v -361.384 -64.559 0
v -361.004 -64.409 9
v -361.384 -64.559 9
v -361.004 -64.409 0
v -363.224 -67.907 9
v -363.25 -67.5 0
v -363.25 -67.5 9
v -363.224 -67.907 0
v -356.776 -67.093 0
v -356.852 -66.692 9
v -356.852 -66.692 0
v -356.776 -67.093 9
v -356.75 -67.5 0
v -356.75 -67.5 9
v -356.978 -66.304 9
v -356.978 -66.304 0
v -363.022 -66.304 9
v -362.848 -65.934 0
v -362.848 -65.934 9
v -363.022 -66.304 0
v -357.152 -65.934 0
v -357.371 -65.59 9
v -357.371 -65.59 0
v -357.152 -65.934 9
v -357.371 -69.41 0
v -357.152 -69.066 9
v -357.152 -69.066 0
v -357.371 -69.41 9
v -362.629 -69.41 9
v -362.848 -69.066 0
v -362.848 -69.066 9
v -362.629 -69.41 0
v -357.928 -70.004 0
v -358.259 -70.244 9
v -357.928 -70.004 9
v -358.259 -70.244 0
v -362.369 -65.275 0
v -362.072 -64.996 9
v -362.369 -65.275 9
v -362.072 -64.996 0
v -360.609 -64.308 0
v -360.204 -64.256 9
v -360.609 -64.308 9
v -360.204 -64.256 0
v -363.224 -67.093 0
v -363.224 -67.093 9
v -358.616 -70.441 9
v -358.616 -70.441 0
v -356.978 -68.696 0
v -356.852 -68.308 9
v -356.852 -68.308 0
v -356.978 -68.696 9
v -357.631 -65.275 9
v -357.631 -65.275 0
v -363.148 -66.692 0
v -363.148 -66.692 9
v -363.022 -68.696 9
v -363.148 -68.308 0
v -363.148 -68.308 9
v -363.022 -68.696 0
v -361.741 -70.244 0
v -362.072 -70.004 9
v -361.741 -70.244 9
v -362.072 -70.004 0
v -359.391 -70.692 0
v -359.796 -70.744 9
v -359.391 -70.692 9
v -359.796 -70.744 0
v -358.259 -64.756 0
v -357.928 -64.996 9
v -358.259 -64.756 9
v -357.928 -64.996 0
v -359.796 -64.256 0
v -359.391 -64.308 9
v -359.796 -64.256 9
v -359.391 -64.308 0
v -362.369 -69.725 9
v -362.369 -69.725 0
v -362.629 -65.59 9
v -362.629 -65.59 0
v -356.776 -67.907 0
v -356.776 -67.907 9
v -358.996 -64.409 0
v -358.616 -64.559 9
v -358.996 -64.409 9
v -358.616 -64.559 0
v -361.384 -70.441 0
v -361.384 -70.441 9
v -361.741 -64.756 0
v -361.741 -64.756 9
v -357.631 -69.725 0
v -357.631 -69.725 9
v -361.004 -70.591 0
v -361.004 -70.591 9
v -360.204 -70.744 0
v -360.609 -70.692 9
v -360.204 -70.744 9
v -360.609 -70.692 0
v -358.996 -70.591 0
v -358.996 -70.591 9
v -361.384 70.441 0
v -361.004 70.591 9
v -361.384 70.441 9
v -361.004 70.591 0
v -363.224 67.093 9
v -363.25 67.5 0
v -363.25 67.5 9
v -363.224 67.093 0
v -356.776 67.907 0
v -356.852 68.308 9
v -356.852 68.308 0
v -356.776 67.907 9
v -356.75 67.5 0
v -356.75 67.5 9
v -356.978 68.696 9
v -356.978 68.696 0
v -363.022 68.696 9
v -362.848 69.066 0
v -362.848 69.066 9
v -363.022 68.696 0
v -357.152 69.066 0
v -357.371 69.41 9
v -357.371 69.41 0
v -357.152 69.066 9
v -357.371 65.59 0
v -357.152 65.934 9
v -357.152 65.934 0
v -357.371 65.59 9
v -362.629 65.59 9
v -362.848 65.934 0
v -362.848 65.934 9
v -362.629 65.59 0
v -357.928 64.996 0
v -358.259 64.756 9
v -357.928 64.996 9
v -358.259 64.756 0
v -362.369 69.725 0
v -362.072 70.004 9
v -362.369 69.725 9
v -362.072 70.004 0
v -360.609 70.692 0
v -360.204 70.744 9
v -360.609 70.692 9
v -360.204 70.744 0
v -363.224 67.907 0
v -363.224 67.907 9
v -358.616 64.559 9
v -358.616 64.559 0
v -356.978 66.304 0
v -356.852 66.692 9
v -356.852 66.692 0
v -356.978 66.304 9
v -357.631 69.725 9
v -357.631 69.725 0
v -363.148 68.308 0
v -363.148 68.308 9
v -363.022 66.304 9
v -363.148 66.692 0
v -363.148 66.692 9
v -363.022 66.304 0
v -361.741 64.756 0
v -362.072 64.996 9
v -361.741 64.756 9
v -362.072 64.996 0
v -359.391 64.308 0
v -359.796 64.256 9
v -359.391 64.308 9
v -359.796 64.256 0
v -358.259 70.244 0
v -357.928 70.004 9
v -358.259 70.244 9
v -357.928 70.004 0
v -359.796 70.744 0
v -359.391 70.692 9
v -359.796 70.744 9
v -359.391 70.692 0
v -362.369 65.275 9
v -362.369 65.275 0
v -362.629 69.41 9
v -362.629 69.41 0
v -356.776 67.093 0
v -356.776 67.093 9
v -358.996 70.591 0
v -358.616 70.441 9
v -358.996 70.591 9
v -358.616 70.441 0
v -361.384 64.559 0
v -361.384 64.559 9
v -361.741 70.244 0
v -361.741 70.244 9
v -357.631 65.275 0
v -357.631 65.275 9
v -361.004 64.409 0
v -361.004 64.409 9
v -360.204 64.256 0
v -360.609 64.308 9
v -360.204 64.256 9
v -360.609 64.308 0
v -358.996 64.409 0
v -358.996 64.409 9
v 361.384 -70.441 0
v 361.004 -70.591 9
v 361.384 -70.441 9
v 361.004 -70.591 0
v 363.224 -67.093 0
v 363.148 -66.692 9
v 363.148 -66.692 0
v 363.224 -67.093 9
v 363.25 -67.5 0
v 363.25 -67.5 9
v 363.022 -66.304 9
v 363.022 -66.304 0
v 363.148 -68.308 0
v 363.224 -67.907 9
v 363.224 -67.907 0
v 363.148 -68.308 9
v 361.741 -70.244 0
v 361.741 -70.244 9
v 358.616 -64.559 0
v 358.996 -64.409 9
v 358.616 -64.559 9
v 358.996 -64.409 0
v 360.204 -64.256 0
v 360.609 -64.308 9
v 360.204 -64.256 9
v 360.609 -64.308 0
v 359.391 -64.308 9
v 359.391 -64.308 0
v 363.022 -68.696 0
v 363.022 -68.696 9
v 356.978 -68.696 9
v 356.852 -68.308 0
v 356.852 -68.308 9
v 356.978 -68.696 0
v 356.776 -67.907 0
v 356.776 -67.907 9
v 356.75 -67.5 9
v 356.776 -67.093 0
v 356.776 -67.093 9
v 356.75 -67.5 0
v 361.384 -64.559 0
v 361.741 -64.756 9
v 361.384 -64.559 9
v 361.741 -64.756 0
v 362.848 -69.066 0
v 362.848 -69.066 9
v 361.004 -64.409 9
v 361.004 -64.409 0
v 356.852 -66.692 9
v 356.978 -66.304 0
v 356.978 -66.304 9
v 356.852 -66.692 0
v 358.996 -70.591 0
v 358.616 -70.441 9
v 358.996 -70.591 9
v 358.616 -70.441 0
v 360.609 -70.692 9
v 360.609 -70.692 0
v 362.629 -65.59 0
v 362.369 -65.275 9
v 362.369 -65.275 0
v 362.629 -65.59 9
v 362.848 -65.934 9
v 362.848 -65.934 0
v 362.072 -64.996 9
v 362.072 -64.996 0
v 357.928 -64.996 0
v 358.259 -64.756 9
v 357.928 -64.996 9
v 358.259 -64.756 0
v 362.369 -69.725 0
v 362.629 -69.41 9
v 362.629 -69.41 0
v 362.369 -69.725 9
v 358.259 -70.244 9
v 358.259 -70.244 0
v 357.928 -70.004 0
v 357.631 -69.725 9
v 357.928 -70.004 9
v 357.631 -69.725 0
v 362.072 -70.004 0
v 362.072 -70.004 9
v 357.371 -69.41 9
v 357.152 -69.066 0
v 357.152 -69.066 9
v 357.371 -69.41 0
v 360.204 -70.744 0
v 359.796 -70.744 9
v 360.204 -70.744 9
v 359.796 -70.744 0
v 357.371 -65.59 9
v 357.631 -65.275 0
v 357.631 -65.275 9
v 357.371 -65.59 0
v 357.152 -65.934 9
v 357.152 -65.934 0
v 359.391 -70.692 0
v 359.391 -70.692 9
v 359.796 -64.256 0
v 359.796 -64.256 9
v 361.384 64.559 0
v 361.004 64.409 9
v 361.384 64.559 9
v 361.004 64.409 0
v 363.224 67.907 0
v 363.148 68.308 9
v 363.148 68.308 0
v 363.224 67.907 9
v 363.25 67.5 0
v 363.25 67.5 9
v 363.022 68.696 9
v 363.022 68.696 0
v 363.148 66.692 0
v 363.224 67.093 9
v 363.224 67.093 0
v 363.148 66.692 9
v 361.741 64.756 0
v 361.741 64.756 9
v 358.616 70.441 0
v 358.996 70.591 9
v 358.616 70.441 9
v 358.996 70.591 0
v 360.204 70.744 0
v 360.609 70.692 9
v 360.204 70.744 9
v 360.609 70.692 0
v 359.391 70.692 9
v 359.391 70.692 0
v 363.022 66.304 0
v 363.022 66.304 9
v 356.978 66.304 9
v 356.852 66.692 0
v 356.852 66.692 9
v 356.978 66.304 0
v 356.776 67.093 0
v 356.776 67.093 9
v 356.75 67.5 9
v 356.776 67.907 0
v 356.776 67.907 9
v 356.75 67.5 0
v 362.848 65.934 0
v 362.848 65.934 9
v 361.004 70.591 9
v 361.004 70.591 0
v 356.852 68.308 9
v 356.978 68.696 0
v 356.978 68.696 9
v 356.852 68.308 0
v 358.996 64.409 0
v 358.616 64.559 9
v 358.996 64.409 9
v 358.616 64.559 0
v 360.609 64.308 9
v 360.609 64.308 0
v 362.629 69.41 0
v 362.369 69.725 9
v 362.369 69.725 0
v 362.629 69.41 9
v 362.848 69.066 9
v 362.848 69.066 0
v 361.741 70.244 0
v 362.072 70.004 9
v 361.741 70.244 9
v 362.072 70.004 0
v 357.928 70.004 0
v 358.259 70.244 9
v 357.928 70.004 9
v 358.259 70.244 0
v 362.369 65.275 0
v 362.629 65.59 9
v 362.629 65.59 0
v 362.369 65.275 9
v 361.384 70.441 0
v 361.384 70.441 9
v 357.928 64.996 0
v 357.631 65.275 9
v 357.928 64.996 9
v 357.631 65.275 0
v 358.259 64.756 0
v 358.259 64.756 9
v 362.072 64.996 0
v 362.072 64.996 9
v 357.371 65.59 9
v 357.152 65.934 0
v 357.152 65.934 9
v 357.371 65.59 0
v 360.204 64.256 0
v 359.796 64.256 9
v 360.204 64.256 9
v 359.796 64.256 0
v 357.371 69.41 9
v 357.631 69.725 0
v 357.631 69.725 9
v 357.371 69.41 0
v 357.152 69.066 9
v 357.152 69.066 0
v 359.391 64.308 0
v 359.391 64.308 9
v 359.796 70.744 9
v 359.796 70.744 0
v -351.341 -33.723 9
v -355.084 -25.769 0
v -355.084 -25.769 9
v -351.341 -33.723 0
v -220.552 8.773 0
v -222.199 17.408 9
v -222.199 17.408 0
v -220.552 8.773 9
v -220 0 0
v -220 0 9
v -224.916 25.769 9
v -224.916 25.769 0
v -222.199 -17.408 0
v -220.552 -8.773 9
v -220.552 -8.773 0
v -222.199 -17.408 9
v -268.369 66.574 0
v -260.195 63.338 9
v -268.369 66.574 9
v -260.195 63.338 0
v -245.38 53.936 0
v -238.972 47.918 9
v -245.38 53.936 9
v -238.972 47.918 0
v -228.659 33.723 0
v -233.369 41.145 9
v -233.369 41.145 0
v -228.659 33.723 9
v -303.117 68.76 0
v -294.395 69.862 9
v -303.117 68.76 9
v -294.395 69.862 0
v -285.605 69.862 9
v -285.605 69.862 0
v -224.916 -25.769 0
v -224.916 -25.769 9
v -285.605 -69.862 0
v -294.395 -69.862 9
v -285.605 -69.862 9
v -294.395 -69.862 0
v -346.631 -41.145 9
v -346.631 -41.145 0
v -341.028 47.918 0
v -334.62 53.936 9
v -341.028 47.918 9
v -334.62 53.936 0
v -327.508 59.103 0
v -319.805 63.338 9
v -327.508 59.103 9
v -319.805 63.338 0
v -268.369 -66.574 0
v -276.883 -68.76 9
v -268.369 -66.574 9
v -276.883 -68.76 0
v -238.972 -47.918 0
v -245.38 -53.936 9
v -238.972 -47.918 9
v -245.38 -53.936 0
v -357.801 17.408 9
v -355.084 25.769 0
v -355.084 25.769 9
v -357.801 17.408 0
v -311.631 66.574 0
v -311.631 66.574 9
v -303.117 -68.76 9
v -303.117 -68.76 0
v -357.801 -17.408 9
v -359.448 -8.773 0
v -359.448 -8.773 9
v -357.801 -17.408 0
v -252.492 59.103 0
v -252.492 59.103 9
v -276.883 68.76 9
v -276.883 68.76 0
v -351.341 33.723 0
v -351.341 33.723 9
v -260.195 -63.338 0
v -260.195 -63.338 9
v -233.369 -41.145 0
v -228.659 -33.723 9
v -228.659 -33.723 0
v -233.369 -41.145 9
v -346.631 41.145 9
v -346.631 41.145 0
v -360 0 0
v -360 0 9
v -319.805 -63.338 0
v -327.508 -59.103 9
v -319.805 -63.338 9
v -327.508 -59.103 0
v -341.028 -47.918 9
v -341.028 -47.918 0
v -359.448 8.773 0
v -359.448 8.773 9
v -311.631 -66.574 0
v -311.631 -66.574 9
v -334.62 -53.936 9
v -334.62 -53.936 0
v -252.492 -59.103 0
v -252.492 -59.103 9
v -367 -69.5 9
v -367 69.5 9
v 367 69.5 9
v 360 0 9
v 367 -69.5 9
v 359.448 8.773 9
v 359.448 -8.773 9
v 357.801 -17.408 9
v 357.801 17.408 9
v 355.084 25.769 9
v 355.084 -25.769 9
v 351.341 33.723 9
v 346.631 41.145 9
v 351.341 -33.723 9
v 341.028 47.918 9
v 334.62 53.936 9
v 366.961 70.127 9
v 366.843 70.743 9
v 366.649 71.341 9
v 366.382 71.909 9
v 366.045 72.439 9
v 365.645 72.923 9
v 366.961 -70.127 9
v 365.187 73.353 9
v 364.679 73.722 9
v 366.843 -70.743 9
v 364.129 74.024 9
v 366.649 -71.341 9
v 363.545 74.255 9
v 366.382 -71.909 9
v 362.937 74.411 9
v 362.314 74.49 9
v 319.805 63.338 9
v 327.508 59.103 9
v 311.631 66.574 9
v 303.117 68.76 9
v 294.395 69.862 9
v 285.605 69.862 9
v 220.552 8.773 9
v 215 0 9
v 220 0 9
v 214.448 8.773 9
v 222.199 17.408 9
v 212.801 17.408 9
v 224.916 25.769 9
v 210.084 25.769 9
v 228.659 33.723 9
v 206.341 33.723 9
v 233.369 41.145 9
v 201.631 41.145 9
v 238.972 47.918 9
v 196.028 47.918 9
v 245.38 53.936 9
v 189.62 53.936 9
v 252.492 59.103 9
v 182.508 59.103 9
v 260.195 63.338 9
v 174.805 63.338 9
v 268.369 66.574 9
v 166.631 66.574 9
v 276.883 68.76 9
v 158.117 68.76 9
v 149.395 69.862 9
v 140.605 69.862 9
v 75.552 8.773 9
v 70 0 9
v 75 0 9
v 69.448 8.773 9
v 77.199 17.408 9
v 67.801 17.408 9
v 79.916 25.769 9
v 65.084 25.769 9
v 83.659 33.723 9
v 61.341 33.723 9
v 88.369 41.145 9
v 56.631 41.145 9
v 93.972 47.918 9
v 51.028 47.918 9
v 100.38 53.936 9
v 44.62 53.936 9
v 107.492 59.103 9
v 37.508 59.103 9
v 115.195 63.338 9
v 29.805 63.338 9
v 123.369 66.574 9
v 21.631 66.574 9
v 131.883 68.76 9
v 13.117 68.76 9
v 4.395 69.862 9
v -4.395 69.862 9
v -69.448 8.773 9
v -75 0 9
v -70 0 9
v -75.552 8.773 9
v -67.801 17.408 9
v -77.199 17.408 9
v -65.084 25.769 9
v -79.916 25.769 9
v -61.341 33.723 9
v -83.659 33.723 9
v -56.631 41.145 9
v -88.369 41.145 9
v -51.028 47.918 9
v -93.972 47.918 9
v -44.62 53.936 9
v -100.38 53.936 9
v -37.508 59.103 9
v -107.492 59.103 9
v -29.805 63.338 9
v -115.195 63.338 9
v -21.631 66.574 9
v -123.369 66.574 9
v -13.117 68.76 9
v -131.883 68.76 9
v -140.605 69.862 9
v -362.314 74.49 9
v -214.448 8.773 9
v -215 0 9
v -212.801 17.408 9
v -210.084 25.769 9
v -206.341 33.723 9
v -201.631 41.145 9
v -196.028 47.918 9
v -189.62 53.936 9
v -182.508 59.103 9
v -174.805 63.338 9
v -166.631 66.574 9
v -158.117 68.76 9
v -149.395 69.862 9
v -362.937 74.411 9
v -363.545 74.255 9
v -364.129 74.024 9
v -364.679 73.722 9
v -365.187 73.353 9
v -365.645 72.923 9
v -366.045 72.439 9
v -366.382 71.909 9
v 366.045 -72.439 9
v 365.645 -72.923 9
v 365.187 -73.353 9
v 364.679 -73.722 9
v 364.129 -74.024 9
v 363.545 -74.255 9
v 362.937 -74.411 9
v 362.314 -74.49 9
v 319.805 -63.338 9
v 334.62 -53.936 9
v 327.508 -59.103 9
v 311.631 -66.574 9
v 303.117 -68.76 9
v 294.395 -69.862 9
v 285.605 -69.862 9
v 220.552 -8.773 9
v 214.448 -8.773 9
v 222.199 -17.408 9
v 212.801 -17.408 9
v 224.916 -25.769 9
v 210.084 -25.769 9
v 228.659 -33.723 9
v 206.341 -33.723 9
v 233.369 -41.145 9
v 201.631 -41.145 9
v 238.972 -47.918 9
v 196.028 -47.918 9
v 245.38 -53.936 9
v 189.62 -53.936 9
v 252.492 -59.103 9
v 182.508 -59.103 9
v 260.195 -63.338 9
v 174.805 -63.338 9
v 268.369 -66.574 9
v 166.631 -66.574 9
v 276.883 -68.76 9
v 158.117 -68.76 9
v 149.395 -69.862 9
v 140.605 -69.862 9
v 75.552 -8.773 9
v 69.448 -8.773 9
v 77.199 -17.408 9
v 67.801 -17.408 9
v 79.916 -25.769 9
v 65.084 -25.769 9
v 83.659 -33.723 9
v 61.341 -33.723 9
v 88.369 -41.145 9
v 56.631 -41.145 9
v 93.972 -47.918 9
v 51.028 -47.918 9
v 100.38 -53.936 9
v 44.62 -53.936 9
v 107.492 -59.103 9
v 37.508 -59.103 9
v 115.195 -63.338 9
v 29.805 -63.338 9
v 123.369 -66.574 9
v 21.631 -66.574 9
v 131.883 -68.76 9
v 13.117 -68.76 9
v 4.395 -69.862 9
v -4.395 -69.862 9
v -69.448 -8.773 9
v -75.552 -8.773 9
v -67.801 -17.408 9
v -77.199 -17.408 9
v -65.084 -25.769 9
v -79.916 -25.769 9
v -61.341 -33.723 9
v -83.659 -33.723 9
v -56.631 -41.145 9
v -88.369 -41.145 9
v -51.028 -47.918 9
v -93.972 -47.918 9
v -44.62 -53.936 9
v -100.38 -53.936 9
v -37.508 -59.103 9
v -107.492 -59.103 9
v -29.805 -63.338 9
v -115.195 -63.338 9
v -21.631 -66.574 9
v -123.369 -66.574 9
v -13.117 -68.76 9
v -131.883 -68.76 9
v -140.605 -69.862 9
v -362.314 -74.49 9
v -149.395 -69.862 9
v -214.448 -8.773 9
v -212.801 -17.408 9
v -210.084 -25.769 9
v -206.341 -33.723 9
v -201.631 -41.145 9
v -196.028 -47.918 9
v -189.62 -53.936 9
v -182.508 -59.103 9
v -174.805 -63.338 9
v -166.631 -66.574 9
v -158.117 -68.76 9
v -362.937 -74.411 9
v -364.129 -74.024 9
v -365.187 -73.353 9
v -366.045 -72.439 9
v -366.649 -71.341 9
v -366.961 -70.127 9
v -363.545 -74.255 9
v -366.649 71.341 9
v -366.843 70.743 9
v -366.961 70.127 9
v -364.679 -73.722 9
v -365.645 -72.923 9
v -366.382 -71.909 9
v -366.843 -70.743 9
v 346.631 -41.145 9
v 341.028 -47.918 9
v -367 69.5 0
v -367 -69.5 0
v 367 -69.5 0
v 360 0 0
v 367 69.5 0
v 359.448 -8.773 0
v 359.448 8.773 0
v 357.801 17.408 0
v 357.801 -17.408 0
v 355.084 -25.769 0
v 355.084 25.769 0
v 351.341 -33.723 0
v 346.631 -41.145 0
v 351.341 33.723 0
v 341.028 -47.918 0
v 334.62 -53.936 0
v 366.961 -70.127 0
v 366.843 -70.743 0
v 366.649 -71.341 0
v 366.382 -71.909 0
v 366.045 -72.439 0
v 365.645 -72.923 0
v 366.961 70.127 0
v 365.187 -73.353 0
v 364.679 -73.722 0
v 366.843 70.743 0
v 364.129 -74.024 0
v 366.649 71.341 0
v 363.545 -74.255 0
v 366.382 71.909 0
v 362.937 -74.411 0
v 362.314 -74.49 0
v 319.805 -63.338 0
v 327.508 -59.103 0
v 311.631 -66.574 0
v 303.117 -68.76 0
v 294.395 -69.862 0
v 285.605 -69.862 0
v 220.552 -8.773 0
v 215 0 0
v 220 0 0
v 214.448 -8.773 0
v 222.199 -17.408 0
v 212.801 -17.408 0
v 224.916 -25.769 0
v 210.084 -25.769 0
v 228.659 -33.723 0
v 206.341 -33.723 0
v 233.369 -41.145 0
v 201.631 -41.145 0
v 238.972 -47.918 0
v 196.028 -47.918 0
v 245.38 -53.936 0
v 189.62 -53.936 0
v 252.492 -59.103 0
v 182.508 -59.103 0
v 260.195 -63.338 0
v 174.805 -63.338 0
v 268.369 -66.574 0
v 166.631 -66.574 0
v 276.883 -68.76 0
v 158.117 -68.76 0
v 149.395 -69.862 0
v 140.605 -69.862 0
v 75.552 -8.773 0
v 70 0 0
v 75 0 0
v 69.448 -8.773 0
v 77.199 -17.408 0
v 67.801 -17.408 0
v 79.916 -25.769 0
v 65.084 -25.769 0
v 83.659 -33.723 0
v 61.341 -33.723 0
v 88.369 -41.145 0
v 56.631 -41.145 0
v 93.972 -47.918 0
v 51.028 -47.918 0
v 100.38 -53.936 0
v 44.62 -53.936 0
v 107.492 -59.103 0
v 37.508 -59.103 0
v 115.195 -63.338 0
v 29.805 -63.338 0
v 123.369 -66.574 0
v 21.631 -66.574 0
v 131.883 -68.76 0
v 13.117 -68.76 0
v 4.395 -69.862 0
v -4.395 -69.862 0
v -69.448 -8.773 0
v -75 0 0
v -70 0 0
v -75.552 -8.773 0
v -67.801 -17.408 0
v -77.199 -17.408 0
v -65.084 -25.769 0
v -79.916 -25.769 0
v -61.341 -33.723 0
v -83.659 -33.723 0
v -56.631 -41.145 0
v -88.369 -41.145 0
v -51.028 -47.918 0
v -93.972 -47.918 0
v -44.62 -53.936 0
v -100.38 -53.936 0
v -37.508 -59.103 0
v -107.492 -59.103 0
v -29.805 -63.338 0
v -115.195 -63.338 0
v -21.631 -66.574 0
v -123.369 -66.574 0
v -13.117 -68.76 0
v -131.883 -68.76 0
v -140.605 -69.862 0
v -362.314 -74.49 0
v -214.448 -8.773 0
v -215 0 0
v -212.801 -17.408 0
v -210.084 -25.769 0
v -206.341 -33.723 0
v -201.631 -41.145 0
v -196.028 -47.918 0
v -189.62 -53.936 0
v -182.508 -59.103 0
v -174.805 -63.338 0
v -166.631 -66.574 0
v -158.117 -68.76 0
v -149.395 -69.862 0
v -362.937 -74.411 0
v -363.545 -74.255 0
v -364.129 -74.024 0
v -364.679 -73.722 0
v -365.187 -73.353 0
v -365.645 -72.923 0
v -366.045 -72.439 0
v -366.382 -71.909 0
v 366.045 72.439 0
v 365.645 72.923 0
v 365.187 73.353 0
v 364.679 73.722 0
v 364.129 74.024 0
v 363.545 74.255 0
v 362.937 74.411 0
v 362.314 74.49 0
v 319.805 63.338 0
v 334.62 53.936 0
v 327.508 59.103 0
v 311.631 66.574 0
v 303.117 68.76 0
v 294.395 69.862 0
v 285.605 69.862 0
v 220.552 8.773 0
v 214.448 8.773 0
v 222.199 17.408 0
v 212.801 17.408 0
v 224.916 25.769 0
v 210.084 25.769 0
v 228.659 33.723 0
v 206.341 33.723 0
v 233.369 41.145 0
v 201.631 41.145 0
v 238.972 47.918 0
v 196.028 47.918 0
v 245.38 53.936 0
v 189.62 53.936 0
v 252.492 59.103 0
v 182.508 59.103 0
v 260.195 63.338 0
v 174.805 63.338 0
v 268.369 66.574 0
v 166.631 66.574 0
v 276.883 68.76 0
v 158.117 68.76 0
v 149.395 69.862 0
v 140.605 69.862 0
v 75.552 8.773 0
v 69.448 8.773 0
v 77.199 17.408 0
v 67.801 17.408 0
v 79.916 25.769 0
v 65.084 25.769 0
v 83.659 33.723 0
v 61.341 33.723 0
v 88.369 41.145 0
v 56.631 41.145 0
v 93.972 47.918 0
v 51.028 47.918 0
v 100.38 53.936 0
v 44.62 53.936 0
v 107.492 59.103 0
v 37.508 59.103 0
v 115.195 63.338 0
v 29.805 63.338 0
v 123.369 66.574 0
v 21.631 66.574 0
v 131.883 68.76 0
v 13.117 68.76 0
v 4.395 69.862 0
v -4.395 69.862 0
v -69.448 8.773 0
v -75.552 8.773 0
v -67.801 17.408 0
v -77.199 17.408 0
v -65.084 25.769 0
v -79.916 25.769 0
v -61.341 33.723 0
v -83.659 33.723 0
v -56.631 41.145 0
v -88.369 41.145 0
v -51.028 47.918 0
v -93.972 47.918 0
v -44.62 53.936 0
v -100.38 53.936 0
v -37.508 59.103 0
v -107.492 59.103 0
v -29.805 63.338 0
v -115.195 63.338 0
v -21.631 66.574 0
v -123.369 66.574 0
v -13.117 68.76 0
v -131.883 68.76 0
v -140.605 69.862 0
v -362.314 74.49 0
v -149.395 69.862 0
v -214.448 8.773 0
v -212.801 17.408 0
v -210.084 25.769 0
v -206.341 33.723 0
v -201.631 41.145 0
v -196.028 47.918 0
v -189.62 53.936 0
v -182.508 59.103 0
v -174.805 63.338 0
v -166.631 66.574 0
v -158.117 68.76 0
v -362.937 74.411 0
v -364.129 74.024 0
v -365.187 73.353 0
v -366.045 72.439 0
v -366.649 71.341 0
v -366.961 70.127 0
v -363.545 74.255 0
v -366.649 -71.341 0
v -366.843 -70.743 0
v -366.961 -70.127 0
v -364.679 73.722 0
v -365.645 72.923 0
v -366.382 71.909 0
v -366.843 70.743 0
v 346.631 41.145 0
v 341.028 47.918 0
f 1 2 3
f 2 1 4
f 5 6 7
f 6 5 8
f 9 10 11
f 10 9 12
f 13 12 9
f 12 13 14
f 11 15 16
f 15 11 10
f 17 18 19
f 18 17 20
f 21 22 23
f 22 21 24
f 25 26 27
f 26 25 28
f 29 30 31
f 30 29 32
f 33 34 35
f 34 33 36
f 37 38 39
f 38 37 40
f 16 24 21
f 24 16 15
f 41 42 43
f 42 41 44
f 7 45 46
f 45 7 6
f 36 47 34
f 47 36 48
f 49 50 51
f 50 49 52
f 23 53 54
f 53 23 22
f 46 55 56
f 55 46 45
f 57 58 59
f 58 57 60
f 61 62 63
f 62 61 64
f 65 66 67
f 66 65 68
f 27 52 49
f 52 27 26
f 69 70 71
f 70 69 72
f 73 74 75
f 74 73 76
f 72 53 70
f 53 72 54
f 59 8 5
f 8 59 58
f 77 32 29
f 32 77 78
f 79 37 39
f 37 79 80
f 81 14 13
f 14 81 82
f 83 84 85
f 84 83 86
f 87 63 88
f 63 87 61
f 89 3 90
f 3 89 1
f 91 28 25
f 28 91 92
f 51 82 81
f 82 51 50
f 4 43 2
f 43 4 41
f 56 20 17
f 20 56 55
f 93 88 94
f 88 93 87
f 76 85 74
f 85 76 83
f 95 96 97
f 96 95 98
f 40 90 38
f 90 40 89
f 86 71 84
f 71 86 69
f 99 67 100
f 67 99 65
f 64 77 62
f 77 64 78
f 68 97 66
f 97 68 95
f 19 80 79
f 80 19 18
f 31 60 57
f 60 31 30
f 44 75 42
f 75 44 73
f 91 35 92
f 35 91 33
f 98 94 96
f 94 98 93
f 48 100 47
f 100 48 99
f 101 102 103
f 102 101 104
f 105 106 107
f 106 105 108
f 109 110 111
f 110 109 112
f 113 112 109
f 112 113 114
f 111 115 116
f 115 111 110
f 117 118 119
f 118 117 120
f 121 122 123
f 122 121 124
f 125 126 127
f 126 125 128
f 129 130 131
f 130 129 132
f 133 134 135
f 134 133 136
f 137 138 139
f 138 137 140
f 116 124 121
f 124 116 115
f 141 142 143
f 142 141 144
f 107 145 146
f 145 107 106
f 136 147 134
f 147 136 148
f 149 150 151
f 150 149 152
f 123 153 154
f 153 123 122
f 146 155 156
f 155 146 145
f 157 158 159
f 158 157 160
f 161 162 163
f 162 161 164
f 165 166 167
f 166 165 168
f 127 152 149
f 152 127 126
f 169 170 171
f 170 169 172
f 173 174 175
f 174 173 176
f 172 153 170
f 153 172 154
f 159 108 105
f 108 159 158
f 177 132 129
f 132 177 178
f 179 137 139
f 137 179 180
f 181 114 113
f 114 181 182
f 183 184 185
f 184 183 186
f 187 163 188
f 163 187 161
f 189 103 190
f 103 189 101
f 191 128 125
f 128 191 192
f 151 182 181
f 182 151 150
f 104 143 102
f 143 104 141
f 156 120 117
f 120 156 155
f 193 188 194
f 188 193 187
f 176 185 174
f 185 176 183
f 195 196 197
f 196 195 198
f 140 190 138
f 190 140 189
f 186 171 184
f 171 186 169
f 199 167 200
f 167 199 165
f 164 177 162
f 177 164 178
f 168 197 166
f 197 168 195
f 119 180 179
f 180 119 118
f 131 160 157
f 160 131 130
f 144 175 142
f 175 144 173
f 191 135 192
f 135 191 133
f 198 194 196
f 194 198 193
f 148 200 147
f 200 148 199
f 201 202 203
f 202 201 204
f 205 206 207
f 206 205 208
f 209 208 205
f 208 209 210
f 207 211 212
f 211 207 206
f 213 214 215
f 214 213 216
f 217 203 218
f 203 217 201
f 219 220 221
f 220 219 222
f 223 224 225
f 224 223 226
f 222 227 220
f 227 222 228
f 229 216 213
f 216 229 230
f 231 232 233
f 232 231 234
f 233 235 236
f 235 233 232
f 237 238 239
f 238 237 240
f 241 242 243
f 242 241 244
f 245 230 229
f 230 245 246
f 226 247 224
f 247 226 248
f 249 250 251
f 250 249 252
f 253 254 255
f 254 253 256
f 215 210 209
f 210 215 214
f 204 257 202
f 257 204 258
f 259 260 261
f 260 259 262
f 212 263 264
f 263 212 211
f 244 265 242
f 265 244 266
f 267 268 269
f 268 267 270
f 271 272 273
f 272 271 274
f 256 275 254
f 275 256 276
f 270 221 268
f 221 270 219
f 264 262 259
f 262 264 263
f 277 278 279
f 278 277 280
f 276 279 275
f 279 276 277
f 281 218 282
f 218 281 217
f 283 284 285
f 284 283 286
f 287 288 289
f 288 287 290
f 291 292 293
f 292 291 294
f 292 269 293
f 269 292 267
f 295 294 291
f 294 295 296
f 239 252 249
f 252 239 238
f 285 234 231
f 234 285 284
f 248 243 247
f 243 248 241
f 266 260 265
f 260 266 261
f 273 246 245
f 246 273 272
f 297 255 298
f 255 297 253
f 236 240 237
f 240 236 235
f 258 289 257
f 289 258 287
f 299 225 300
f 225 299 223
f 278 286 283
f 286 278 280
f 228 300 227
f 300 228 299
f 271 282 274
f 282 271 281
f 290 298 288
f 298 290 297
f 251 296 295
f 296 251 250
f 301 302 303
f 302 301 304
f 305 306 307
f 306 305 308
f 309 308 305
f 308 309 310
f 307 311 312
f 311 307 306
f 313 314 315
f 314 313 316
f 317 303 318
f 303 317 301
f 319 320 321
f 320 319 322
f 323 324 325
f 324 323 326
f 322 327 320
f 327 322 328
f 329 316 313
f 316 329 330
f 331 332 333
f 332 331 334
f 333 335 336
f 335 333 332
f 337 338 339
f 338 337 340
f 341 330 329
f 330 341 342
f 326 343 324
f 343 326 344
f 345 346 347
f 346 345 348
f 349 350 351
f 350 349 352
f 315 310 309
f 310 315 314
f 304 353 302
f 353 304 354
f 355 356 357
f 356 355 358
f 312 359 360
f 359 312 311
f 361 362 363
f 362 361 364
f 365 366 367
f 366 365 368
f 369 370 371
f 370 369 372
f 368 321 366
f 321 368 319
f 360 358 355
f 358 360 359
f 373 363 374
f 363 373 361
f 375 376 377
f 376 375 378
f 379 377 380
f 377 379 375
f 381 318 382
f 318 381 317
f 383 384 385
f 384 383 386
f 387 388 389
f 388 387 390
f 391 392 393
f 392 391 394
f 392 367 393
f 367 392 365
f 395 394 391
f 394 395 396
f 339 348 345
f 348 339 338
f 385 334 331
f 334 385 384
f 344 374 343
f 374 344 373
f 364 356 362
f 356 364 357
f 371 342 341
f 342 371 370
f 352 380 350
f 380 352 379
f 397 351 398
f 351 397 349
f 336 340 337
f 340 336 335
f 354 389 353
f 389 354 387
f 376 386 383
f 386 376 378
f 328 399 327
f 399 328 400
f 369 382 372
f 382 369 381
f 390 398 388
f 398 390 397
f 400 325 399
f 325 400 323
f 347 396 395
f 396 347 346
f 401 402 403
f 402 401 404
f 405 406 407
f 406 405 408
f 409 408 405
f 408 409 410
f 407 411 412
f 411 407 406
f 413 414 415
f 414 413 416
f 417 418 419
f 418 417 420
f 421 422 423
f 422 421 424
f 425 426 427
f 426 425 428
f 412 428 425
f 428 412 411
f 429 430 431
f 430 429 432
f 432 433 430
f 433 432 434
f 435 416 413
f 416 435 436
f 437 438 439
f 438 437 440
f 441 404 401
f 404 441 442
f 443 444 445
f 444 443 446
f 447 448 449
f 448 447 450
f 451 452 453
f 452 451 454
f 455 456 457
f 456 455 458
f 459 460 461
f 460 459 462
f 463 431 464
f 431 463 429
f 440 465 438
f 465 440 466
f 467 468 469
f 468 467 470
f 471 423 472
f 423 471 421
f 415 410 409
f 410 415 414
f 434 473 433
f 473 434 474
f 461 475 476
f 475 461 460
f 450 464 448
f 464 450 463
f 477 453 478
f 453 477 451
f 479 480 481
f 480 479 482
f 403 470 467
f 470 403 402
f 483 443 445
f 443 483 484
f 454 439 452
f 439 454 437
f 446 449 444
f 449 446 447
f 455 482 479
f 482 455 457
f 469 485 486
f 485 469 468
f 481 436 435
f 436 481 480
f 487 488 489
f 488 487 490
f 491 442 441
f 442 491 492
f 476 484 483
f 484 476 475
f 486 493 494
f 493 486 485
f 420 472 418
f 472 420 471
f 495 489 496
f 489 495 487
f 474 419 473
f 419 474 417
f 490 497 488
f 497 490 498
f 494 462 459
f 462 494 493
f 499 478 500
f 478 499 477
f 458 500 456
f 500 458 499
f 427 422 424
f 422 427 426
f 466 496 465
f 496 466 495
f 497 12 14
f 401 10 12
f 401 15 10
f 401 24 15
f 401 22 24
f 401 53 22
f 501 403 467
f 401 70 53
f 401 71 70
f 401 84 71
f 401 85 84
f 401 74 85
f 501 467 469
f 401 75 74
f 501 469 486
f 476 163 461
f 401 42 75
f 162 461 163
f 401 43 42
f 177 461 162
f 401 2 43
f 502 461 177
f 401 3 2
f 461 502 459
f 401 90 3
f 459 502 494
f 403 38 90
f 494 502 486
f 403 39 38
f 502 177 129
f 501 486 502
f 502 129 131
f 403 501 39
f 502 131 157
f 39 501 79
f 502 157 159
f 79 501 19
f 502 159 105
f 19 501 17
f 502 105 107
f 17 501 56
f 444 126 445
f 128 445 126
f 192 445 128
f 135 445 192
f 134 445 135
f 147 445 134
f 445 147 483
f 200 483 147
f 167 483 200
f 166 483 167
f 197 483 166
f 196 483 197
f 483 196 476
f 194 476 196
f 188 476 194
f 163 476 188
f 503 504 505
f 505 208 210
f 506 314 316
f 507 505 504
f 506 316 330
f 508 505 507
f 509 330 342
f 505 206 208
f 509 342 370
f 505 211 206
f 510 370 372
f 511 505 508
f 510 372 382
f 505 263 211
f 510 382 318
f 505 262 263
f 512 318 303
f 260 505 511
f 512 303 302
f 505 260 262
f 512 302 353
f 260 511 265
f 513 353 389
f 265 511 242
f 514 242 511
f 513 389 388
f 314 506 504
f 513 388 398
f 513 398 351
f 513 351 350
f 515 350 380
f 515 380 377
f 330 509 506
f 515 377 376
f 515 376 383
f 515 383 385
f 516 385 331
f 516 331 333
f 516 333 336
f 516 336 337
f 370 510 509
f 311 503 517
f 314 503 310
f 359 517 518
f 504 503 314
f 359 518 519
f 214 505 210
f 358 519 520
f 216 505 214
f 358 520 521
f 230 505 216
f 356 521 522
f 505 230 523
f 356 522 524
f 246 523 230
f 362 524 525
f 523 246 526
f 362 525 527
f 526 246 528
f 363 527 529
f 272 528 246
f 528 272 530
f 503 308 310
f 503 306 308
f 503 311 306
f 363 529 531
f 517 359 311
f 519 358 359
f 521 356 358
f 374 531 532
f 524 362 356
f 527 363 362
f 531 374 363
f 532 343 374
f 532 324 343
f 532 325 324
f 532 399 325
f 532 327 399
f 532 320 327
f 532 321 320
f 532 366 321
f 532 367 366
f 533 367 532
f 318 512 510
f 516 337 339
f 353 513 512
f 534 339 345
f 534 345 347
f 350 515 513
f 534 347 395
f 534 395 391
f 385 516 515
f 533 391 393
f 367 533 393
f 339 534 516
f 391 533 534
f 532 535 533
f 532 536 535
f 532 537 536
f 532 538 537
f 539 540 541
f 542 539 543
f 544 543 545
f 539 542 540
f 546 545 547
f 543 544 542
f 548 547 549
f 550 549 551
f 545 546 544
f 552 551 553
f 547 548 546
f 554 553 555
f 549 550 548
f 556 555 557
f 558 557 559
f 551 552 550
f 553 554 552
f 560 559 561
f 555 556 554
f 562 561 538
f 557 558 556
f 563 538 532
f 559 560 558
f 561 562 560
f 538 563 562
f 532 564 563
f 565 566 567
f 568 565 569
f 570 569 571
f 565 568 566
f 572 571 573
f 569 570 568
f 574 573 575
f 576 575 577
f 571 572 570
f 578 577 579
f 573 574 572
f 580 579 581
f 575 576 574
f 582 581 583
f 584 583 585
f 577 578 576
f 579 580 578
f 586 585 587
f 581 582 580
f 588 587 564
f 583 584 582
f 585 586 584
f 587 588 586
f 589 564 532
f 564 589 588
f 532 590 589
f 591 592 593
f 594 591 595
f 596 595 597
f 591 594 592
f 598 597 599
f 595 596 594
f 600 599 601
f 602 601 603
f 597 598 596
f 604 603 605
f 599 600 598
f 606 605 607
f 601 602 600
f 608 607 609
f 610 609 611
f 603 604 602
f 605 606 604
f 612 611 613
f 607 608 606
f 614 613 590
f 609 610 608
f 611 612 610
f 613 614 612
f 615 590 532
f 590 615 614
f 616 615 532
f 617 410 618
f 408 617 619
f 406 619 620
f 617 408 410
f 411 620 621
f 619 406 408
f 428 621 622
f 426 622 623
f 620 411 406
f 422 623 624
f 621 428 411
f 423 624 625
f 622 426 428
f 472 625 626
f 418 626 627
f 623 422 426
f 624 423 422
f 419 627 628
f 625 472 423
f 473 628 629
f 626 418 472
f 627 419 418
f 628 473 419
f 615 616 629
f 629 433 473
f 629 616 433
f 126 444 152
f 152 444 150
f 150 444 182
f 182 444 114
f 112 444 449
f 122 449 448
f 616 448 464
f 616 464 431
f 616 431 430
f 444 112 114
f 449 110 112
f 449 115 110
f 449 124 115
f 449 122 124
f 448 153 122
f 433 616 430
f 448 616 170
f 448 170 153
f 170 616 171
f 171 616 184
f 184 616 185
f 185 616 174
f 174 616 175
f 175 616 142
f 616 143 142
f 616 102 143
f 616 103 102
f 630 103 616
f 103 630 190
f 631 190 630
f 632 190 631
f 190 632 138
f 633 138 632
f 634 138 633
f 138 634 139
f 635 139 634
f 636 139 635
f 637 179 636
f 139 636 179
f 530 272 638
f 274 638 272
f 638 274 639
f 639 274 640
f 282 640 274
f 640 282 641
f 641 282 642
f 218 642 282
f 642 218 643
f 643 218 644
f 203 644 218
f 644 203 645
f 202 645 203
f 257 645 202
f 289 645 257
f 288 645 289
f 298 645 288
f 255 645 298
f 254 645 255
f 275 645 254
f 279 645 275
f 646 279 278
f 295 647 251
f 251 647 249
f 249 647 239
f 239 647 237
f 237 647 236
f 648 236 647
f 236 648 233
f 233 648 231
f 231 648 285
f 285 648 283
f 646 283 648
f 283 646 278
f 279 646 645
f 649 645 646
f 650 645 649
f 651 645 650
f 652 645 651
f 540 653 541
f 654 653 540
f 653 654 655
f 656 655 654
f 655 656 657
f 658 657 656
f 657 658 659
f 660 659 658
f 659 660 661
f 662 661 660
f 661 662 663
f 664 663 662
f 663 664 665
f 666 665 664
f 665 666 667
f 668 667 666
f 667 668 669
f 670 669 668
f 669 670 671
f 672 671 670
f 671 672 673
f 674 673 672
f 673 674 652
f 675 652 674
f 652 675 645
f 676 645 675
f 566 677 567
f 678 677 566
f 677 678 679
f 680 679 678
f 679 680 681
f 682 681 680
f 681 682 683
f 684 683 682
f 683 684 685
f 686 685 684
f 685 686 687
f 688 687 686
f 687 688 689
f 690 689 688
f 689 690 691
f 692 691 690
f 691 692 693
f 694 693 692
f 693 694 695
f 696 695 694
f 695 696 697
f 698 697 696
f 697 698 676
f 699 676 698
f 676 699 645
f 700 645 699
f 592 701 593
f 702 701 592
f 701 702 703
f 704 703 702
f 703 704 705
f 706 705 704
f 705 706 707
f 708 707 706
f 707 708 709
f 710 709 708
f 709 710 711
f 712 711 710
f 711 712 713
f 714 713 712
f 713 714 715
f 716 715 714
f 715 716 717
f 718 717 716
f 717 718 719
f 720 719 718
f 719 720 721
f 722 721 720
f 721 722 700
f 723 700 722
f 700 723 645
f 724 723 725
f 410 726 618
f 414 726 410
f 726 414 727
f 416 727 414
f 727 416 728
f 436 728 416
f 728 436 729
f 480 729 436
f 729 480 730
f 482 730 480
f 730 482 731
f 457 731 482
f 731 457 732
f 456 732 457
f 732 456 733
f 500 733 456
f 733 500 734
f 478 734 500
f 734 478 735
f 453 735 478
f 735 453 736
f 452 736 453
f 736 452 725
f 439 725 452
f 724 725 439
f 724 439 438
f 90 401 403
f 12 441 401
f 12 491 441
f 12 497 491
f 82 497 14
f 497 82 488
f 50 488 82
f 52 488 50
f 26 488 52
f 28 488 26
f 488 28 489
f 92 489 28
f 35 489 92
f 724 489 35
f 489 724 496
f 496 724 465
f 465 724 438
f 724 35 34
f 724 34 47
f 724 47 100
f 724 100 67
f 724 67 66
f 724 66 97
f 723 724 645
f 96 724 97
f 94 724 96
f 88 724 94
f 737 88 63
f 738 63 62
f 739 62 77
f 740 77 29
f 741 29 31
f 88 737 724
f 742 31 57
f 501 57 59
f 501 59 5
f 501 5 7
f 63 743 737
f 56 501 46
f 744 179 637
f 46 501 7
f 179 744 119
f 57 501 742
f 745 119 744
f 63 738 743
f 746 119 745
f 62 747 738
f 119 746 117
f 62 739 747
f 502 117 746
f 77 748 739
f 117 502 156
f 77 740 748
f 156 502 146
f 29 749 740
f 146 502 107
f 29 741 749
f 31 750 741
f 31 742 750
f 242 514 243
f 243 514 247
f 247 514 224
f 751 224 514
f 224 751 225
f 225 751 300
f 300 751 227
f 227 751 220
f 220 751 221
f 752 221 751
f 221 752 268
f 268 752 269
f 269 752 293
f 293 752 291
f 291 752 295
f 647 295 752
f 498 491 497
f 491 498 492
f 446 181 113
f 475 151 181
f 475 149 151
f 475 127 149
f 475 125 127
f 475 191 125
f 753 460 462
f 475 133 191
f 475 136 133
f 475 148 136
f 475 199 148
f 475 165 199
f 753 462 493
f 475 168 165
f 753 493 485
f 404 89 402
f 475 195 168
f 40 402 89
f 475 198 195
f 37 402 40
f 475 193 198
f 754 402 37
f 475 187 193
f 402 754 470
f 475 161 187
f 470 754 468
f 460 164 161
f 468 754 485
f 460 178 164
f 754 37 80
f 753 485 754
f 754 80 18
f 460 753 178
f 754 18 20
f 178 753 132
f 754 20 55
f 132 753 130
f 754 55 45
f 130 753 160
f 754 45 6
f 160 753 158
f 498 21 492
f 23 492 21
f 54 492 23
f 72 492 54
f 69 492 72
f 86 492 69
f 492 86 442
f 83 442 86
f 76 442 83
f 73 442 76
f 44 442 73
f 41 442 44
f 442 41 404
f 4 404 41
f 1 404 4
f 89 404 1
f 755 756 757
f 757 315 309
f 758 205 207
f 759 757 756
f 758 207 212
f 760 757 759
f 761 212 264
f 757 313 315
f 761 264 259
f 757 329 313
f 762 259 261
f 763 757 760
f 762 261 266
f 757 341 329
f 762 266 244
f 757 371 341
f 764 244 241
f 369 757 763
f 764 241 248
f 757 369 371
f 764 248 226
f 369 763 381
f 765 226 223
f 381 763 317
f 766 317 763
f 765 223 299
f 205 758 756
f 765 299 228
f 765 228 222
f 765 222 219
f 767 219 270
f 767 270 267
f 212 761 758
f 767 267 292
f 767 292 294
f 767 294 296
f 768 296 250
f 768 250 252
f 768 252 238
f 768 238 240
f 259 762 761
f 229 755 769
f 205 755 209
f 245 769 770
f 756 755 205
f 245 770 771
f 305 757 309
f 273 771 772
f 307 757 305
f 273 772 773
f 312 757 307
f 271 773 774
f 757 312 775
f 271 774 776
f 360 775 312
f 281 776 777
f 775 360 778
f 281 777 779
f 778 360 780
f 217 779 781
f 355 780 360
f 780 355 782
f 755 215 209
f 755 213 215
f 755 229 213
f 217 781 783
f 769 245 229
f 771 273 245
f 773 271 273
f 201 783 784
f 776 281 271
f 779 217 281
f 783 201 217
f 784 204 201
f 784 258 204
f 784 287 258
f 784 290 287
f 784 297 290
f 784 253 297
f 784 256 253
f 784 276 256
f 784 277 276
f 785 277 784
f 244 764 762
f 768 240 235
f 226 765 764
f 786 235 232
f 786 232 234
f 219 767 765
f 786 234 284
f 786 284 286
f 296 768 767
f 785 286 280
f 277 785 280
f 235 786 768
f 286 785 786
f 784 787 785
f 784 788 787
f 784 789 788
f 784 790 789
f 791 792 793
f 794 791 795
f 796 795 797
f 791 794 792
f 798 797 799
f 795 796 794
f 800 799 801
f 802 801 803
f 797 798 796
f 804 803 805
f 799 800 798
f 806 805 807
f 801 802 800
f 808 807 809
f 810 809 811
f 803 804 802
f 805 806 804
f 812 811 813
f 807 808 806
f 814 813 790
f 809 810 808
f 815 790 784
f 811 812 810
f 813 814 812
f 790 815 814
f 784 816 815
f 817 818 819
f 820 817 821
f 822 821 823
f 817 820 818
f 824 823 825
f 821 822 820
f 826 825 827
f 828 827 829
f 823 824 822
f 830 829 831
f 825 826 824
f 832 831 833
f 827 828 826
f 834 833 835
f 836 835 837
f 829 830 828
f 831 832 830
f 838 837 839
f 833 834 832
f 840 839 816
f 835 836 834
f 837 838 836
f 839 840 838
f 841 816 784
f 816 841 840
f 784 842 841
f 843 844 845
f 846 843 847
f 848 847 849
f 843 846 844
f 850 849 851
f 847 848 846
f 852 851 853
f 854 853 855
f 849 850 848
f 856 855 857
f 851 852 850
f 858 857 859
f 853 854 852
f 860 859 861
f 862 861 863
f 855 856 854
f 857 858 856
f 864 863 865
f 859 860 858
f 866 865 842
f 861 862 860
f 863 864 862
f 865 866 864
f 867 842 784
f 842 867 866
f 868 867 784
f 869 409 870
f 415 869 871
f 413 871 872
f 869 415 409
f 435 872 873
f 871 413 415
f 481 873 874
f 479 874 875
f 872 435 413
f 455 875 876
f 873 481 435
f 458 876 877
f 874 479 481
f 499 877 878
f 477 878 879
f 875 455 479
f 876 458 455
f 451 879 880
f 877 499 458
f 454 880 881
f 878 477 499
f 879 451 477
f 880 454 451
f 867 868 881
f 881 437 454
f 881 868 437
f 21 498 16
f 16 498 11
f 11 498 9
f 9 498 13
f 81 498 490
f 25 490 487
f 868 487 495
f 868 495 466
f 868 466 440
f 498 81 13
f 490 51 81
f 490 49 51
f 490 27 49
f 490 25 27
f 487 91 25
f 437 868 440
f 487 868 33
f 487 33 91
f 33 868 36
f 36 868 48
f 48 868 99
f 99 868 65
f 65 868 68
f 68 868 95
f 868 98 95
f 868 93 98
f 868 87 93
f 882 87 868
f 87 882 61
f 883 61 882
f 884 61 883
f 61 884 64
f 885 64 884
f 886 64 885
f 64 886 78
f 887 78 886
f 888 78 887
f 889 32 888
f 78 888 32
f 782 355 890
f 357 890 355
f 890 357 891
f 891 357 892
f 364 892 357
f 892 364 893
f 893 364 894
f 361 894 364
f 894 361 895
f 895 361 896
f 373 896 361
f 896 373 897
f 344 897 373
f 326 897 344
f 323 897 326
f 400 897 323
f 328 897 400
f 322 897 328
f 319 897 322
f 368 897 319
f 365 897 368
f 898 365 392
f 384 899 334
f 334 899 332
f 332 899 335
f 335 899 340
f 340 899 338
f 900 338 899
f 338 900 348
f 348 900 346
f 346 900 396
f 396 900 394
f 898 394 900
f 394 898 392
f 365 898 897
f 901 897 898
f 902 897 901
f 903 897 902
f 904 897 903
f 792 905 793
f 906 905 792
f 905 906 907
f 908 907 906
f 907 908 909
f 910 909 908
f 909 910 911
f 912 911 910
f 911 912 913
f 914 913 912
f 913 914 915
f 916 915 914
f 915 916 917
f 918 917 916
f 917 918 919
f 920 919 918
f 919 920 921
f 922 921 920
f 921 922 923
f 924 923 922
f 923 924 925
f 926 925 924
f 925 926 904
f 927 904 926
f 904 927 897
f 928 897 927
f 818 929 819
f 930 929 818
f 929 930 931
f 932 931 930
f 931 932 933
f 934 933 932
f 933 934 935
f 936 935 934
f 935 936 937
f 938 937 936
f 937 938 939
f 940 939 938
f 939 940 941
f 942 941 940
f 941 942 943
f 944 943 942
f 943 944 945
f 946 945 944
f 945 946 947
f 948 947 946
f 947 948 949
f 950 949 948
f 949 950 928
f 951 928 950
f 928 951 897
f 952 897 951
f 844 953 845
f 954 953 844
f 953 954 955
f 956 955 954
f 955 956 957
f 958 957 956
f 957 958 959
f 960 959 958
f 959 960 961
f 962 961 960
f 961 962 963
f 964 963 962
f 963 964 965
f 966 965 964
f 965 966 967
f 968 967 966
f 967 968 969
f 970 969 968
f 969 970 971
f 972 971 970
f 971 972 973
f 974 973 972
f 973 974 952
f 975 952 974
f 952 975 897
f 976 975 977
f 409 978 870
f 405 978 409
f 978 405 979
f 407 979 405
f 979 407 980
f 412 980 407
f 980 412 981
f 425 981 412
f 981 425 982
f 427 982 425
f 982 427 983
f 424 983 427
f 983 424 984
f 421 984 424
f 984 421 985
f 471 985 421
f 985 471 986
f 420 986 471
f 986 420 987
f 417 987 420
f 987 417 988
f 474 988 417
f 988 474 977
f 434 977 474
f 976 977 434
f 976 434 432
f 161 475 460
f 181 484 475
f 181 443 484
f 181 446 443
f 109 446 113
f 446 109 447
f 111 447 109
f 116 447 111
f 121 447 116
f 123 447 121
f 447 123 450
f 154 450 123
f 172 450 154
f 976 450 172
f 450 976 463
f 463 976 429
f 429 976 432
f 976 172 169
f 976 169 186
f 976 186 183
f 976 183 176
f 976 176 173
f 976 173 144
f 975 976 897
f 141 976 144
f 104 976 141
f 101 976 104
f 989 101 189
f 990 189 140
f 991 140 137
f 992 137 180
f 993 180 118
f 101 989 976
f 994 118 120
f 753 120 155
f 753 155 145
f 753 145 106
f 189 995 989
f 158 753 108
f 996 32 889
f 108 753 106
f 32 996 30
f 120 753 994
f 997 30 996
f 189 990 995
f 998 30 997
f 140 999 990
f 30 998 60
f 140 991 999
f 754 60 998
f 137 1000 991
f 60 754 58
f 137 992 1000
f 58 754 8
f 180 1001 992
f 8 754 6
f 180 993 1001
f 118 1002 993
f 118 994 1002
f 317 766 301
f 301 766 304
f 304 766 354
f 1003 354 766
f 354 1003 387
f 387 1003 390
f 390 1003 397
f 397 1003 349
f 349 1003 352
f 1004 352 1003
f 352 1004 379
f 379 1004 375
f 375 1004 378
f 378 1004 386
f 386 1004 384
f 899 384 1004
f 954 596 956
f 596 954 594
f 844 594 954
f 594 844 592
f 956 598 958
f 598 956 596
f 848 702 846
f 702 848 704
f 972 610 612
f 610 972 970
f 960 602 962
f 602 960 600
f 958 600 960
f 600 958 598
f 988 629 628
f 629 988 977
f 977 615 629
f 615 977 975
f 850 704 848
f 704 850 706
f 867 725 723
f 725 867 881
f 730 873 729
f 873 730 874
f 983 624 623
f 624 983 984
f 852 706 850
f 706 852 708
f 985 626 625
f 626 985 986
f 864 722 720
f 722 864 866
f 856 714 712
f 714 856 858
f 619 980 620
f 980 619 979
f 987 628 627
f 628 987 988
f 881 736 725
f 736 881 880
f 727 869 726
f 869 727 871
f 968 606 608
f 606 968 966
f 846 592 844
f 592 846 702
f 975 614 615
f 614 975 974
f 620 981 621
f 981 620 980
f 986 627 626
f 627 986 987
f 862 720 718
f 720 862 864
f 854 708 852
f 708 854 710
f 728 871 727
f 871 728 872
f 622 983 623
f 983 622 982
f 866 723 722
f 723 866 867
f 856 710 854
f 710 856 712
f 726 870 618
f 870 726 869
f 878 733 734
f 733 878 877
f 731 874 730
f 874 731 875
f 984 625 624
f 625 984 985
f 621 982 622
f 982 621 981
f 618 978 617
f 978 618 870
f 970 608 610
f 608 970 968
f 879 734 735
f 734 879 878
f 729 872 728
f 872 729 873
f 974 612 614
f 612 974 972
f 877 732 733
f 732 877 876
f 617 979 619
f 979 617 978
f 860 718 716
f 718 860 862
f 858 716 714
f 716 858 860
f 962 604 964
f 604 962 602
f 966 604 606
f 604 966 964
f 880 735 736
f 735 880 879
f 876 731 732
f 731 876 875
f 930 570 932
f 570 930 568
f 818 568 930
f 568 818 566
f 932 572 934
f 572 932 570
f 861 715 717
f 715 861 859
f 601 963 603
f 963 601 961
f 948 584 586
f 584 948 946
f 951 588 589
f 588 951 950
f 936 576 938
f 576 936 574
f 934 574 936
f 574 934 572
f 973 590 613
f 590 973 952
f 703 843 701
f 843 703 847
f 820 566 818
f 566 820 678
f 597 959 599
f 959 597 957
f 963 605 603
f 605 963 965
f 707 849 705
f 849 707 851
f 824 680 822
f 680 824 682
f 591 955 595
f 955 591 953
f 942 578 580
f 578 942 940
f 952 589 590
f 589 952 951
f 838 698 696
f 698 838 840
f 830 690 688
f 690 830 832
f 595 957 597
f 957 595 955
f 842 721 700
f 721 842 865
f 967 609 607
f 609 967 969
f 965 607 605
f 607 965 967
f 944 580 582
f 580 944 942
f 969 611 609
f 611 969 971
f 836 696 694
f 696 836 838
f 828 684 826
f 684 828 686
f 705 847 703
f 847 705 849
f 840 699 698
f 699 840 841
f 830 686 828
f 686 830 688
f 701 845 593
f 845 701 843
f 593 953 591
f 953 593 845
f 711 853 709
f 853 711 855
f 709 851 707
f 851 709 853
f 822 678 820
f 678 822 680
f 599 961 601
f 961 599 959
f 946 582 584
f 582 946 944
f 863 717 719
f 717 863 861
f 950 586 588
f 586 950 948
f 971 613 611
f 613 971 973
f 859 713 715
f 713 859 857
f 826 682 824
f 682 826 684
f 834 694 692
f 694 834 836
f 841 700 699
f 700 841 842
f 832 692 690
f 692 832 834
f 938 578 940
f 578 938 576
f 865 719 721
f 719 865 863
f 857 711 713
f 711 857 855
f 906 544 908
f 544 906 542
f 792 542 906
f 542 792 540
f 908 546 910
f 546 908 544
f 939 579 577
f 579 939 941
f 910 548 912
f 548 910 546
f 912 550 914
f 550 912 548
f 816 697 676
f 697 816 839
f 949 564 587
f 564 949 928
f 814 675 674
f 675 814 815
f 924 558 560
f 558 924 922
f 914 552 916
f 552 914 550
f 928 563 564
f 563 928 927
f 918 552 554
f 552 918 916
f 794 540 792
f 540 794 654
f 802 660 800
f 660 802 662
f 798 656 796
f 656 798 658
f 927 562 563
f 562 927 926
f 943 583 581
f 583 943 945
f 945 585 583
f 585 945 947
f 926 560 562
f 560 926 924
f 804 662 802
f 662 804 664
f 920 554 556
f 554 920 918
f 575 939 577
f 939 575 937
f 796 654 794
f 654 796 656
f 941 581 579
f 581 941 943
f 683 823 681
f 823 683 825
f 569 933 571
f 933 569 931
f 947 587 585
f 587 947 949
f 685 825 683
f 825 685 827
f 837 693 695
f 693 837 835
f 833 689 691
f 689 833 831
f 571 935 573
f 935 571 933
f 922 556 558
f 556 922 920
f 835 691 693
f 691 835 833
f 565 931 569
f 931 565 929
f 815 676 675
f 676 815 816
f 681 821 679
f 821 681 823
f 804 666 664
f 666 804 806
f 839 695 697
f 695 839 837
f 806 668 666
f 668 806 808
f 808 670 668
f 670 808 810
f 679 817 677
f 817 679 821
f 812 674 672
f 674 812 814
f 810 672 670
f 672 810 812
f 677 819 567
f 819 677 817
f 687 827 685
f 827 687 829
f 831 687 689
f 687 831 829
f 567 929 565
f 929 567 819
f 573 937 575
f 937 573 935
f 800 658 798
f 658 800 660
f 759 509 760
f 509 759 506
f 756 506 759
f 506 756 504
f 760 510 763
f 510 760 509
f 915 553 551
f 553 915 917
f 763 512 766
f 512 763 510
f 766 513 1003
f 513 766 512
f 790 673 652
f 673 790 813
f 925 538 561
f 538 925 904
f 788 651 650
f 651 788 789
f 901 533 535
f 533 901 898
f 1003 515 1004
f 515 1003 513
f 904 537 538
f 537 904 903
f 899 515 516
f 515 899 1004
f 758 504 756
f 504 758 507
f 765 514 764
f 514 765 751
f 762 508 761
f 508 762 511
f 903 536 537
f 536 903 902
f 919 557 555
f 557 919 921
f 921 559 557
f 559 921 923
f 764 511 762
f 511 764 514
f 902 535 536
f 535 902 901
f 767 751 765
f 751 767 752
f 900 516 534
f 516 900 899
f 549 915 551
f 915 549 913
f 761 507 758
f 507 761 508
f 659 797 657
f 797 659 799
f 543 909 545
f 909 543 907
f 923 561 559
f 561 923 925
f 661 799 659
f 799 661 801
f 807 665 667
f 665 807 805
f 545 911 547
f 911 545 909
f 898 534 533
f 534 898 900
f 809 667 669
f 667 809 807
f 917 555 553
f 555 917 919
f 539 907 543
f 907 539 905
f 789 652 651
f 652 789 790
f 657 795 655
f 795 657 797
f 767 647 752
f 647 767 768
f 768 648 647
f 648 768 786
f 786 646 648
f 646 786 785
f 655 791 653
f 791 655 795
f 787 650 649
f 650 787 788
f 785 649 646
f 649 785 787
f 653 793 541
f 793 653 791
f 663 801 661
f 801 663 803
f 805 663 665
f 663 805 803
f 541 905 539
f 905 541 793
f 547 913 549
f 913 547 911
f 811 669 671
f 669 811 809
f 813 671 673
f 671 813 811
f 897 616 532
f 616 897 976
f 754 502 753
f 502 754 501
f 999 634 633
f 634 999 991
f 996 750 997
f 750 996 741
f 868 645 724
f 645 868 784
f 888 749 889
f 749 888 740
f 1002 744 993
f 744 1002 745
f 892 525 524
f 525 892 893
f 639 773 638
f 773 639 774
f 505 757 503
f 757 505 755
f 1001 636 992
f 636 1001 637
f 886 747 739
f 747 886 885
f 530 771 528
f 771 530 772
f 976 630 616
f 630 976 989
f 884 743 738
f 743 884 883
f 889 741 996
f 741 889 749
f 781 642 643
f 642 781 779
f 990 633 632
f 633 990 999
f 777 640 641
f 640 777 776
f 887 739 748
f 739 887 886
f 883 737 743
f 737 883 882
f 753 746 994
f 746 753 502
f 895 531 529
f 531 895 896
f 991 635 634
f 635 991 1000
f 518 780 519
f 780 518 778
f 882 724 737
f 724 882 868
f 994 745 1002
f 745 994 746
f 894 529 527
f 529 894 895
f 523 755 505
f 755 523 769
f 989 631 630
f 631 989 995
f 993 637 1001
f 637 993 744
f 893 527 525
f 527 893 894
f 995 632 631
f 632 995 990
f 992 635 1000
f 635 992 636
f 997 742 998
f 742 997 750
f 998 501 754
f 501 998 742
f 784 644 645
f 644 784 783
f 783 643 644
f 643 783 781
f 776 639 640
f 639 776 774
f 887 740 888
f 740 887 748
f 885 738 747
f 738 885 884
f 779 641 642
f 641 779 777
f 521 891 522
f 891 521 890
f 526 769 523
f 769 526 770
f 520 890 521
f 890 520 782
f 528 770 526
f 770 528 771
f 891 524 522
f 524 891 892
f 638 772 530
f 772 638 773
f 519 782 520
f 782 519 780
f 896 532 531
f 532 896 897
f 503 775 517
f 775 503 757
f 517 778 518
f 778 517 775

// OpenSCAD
$fn = 50;


difference() {
	union() {
		hull() {
			translate(v = [-362.0000000000, 69.5000000000, 0]) {
				cylinder(h = 9, r = 5);
			}
			translate(v = [362.0000000000, 69.5000000000, 0]) {
				cylinder(h = 9, r = 5);
			}
			translate(v = [-362.0000000000, -69.5000000000, 0]) {
				cylinder(h = 9, r = 5);
			}
			translate(v = [362.0000000000, -69.5000000000, 0]) {
				cylinder(h = 9, r = 5);
			}
		}
	}
	union() {
		#translate(v = [-360.0000000000, -67.5000000000, -100.0000000000]) {
			cylinder(h = 200, r = 3.2500000000);
		}
		#translate(v = [-360.0000000000, 67.5000000000, -100.0000000000]) {
			cylinder(h = 200, r = 3.2500000000);
		}
		#translate(v = [360.0000000000, -67.5000000000, -100.0000000000]) {
			cylinder(h = 200, r = 3.2500000000);
		}
		#translate(v = [360.0000000000, 67.5000000000, -100.0000000000]) {
			cylinder(h = 200, r = 3.2500000000);
		}
		#translate(v = [-290.0000000000, 0, 0]) {
			cylinder(h = 9, r = 70.0000000000);
		}
		#translate(v = [-145.0000000000, 0, 0]) {
			cylinder(h = 9, r = 70.0000000000);
		}
		#cylinder(h = 9, r = 70.0000000000);
		#translate(v = [145.0000000000, 0, 0]) {
			cylinder(h = 9, r = 70.0000000000);
		}
		#translate(v = [290.0000000000, 0, 0]) {
			cylinder(h = 9, r = 70.0000000000);
		}
	}
}
